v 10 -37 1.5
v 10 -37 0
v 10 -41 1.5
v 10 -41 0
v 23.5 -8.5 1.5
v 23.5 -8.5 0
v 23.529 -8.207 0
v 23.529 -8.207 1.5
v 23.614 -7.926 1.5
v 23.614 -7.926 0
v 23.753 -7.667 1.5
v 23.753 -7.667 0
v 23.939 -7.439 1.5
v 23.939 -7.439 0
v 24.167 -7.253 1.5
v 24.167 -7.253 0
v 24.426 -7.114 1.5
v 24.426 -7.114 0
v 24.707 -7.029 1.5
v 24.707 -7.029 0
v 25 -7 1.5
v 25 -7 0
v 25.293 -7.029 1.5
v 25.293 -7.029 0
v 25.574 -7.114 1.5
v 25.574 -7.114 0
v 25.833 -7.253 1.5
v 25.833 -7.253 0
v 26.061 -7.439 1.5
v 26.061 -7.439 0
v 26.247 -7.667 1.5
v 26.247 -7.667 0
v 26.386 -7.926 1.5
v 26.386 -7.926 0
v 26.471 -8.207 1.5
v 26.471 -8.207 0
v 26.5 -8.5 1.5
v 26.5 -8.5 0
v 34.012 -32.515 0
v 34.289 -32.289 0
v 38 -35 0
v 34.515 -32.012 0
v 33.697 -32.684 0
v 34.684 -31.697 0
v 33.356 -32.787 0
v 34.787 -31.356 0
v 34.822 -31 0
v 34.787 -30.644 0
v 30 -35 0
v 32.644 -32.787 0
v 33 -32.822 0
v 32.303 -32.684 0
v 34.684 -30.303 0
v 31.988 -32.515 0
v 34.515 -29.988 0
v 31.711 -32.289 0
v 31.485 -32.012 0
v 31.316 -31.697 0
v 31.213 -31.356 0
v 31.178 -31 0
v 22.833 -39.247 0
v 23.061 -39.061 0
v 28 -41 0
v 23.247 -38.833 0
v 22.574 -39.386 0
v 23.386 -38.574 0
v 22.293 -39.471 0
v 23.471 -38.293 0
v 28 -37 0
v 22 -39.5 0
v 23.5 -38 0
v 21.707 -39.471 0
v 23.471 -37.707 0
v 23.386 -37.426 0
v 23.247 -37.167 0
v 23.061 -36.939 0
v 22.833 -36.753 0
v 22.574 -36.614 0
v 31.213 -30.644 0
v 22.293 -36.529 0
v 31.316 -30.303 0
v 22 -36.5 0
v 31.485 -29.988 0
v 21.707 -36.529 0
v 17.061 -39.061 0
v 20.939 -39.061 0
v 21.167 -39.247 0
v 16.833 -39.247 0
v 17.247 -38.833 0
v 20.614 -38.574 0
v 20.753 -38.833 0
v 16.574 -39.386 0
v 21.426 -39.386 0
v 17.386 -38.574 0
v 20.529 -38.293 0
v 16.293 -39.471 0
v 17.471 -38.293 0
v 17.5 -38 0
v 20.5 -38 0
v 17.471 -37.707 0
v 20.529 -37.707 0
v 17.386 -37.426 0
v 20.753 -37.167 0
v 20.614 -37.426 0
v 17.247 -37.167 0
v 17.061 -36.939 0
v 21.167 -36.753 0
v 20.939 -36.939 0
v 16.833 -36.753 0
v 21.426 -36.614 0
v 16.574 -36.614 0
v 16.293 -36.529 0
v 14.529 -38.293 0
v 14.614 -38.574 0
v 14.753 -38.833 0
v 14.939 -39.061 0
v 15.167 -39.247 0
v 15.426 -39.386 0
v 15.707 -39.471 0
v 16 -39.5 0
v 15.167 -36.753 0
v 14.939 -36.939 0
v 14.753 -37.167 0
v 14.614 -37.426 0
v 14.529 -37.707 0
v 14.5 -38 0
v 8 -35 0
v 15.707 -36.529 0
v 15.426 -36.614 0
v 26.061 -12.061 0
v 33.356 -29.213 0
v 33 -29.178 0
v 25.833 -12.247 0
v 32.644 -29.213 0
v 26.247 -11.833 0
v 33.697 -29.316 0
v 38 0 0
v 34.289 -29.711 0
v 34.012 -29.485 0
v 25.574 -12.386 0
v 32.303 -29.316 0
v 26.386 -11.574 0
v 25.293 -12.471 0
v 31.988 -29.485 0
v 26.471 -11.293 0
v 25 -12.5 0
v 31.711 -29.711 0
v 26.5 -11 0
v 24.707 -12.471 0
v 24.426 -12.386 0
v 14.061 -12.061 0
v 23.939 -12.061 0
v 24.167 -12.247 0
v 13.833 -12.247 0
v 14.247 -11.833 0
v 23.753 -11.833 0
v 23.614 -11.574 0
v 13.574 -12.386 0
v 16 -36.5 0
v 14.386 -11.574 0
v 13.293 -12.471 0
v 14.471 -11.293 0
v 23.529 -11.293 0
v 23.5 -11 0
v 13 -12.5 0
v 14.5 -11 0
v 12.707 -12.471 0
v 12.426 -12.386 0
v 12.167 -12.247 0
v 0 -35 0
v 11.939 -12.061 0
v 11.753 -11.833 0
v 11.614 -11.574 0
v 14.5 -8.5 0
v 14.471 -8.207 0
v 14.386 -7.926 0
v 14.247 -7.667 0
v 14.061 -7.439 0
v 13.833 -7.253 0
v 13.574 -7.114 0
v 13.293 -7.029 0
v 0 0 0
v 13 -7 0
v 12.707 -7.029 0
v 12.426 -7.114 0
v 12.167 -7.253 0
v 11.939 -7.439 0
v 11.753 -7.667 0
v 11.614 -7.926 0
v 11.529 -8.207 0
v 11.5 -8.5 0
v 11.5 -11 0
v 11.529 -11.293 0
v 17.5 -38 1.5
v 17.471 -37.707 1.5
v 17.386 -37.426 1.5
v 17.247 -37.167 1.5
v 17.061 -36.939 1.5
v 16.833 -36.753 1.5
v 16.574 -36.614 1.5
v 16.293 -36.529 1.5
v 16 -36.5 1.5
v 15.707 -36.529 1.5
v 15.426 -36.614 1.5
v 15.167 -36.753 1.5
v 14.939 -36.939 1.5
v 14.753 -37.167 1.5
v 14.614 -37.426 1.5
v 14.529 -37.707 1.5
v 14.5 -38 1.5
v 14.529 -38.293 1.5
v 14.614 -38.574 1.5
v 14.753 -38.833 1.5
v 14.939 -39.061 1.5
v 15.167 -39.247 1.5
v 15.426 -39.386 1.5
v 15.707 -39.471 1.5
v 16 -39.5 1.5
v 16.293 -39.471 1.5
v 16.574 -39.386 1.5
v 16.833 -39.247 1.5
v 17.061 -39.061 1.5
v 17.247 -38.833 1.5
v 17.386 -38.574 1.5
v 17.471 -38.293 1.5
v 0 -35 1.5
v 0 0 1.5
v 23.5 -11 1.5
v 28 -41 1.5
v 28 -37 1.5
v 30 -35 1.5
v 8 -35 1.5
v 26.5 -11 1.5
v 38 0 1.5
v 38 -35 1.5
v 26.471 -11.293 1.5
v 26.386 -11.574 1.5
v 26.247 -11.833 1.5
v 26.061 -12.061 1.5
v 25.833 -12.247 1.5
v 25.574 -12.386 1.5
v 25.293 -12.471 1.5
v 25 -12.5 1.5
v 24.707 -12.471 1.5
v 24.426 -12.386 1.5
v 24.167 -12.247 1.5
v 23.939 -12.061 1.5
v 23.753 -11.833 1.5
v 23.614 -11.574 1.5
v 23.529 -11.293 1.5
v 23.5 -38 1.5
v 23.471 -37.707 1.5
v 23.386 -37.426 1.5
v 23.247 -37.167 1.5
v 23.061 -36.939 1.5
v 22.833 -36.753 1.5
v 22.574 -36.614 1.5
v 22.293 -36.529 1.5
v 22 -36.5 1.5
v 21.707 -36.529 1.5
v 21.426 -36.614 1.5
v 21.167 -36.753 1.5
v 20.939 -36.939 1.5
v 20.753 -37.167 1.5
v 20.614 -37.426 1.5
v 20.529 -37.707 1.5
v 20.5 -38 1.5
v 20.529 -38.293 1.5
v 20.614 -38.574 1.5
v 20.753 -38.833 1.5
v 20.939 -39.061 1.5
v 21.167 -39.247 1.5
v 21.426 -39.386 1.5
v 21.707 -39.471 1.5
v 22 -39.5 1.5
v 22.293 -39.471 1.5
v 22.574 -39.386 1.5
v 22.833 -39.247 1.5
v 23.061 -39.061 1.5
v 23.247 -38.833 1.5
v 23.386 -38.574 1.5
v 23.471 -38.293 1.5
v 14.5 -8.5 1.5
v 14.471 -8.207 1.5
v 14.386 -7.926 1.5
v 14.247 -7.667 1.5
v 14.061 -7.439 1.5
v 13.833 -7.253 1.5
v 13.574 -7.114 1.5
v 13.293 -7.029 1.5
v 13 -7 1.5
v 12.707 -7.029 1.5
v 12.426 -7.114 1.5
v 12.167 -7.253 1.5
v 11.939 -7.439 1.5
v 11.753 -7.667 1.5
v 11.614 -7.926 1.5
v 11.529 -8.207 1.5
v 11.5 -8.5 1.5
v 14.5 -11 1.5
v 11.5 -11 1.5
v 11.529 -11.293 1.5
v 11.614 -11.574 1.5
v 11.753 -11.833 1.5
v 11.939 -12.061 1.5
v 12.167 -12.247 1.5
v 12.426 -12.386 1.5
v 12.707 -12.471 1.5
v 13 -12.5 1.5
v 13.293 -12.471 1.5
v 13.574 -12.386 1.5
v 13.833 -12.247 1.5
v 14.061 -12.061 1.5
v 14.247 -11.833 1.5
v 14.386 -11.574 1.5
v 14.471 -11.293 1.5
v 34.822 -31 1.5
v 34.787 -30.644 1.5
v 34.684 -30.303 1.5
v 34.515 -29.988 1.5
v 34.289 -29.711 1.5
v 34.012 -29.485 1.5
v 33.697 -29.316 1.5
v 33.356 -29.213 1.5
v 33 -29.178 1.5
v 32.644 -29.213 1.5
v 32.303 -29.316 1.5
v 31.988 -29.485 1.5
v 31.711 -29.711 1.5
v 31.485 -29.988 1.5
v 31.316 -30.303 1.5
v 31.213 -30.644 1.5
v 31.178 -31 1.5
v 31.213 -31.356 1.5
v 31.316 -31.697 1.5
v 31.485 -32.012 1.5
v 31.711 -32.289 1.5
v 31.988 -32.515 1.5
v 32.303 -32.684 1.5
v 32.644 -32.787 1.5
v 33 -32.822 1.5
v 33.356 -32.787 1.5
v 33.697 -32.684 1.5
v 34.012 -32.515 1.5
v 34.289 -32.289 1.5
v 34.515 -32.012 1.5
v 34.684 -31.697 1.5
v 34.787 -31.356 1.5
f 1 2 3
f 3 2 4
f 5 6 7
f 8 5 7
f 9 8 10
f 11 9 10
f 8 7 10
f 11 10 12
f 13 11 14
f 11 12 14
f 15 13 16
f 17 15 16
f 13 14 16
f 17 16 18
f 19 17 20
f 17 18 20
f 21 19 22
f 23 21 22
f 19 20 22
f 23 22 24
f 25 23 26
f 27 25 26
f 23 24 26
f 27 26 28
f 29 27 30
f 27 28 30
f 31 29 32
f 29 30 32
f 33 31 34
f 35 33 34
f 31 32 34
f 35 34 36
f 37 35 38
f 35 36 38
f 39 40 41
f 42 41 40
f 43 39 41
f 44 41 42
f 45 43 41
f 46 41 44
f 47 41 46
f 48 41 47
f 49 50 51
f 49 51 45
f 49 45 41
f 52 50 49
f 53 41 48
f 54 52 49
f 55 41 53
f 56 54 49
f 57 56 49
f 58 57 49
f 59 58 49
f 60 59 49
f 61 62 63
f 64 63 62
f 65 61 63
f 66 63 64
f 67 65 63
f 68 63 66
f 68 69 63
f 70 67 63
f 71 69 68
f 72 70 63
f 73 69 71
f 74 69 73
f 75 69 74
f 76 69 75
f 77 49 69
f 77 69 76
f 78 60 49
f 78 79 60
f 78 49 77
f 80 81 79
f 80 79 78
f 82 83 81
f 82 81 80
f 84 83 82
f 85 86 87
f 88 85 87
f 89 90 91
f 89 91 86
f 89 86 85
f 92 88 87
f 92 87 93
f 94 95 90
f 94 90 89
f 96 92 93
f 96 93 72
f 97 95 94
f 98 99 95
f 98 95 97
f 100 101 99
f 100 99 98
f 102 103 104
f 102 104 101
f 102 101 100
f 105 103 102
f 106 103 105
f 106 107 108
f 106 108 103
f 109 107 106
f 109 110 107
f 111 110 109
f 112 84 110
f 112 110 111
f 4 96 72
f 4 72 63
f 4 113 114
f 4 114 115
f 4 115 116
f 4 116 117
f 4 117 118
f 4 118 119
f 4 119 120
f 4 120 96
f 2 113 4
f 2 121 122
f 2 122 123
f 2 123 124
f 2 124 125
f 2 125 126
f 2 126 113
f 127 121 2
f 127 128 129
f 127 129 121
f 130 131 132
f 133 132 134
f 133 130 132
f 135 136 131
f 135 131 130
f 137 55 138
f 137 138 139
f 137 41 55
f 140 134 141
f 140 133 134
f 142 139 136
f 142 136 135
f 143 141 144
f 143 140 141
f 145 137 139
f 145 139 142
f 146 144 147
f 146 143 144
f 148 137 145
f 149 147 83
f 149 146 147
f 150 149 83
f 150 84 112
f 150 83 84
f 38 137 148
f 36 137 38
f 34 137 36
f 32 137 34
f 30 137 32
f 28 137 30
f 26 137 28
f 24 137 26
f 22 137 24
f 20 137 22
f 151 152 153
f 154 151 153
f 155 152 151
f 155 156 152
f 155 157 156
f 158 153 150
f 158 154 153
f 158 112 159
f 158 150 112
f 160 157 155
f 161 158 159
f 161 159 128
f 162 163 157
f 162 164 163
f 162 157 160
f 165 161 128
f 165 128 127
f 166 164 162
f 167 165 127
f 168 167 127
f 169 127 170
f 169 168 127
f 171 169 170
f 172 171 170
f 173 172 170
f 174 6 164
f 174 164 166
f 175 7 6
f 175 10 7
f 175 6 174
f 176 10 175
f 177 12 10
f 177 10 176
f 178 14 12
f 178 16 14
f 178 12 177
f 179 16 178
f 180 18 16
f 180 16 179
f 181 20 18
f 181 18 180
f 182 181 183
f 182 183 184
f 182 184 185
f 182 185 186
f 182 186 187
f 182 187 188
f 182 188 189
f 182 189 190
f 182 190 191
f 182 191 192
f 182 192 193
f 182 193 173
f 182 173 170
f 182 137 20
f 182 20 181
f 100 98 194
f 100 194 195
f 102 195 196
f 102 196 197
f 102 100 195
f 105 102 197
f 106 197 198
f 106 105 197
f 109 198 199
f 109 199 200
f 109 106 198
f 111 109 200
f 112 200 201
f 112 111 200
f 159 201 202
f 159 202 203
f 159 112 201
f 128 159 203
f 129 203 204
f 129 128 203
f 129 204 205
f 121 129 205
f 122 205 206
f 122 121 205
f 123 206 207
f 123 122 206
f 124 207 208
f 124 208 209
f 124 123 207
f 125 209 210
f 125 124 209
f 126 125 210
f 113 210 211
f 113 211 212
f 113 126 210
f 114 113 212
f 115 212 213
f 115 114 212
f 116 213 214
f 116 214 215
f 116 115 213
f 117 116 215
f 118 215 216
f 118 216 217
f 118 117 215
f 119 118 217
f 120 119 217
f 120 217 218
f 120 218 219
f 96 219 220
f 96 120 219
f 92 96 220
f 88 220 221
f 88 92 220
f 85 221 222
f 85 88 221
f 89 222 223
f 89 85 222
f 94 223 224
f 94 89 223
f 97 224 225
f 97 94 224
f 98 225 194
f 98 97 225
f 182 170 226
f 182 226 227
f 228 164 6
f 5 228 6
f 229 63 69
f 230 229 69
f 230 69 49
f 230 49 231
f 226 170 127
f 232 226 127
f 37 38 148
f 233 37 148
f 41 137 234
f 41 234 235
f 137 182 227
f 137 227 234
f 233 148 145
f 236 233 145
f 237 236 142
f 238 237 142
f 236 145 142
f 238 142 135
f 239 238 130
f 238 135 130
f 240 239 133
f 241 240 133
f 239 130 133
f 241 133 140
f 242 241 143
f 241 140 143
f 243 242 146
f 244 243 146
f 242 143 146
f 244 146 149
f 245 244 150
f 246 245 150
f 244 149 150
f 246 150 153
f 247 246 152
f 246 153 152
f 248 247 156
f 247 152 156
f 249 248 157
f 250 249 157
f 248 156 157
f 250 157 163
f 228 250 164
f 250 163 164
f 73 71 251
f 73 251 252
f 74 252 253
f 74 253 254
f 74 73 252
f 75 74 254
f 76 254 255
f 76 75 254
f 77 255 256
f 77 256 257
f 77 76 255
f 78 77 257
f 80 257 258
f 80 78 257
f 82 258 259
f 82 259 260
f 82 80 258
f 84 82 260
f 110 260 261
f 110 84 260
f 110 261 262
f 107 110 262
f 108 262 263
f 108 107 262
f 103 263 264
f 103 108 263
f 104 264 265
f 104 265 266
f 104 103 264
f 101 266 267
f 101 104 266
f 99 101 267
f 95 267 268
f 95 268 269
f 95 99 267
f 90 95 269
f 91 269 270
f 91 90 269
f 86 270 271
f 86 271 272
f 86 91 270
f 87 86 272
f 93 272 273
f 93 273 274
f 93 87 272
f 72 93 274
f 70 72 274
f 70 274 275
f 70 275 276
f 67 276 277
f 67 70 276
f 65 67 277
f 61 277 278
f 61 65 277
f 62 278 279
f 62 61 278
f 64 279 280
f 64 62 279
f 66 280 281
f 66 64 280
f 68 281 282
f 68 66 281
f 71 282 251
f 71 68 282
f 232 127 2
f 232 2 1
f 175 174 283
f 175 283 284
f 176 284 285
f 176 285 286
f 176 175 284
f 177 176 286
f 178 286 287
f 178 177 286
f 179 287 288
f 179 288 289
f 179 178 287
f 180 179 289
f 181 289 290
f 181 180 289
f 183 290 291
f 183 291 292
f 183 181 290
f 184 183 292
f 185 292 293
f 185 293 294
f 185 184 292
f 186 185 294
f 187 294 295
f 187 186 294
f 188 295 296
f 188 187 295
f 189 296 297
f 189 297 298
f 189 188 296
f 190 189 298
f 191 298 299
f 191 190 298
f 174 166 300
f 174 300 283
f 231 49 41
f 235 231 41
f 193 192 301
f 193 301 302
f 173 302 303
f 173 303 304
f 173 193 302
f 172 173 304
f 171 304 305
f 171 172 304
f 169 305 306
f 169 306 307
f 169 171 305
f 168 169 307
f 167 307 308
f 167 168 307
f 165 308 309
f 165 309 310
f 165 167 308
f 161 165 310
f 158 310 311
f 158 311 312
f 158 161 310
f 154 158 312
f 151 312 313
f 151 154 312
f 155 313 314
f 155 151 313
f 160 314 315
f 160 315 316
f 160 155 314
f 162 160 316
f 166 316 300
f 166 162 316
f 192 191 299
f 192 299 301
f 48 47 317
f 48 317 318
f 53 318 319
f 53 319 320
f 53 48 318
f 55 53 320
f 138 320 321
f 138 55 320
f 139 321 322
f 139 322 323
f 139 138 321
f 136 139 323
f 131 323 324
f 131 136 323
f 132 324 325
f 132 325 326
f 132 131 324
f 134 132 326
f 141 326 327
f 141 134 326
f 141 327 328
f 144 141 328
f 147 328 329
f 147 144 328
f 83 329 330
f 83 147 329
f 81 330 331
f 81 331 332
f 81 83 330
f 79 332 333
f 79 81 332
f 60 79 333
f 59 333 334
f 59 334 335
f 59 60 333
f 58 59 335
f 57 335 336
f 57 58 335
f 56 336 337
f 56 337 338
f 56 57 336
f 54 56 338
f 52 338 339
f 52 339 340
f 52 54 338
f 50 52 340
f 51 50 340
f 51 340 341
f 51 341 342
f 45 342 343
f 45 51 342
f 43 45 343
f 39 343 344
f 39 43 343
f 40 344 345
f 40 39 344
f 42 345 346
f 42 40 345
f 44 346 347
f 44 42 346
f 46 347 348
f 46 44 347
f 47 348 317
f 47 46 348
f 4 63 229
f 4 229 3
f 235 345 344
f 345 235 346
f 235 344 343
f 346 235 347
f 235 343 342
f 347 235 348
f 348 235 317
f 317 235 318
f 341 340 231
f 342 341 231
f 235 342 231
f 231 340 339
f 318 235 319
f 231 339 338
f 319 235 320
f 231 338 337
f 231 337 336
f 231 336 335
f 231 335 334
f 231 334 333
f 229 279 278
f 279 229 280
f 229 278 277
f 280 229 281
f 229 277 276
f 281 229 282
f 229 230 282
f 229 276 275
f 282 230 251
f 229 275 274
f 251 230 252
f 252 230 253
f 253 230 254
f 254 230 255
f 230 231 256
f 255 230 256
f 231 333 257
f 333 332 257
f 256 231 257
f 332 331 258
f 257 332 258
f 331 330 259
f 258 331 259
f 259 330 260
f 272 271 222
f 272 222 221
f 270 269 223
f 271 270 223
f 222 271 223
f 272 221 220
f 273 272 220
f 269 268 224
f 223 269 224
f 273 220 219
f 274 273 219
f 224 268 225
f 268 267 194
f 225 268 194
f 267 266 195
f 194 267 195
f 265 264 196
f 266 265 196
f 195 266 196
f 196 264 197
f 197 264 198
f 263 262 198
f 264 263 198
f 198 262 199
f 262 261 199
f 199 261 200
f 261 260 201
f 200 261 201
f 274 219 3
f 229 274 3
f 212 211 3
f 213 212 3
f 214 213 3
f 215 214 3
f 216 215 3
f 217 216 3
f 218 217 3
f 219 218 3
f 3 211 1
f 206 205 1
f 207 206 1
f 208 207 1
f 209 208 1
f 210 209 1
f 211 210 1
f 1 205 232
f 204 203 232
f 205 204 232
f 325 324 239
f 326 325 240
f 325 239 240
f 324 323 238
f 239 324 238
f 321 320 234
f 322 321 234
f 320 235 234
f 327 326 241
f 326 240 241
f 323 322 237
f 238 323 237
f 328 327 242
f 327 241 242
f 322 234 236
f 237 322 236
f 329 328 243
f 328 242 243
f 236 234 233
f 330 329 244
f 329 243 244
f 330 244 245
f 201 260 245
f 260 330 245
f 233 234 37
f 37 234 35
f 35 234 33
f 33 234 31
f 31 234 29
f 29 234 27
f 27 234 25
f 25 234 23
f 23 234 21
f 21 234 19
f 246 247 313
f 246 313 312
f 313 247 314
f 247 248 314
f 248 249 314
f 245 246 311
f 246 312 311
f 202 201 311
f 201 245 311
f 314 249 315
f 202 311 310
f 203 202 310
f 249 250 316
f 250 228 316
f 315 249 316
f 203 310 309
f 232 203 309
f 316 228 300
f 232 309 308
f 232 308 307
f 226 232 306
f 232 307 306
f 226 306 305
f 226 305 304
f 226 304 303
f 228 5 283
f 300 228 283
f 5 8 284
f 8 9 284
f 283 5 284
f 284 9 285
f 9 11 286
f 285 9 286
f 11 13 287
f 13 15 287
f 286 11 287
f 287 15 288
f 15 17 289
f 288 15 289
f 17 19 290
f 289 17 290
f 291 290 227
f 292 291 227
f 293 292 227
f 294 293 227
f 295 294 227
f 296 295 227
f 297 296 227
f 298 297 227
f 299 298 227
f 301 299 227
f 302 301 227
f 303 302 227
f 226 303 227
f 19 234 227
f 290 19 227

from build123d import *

# Parameters (mm, degrees)
SZKIC1_R                    = 1.5
SZKIC1_R_2                  = 1.822392888
DODANIE_WYCI_GNI_CIE1_DEPTH = 1.5
SFAZOWANIE1_SIZE            = 2


with BuildPart() as part:
    # Szkic1 → Dodanie-wyciągnięcie1 (new body)
    with BuildSketch(Plane.XY):
        Polygon((0, 0), (38, 0), (38, -35), (31.060112688, -35), (28, -35), (28, -40.397059959), (28, -41), (10, -41), (10, -40.699902364), (10, -35), (5.889298893, -35), (0, -35), align=None)
        with Locations((16, -38)):
            Circle(SZKIC1_R, mode=Mode.SUBTRACT)
        with Locations((22, -38)):
            Circle(SZKIC1_R, mode=Mode.SUBTRACT)
        with Locations((33, -31)):
            Circle(SZKIC1_R_2, mode=Mode.SUBTRACT)
        with BuildLine():
            Line((26.5, -8.5), (26.5, -11))
            ThreePointArc((26.5, -11), (25, -12.5), (23.5, -11))
            Line((23.5, -11), (23.5, -8.5))
            ThreePointArc((23.5, -8.5), (25, -7), (26.5, -8.5))
        make_face(mode=Mode.SUBTRACT)
        with BuildLine():
            Line((11.5, -8.5), (11.5, -11))
            ThreePointArc((11.5, -11), (13, -12.5), (14.5, -11))
            Line((14.5, -11), (14.5, -8.5))
            ThreePointArc((14.5, -8.5), (13, -7), (11.5, -8.5))
        make_face(mode=Mode.SUBTRACT)
    extrude(amount=DODANIE_WYCI_GNI_CIE1_DEPTH)

    # Sfazowanie1
    sfazowanie1_edges = [part.edges().sort_by_distance(p)[0] for p in [
        (28, -35, 0.75),
        (10, -35, 0.75),
    ]]
    chamfer(sfazowanie1_edges, length=SFAZOWANIE1_SIZE)


solid = part.part
